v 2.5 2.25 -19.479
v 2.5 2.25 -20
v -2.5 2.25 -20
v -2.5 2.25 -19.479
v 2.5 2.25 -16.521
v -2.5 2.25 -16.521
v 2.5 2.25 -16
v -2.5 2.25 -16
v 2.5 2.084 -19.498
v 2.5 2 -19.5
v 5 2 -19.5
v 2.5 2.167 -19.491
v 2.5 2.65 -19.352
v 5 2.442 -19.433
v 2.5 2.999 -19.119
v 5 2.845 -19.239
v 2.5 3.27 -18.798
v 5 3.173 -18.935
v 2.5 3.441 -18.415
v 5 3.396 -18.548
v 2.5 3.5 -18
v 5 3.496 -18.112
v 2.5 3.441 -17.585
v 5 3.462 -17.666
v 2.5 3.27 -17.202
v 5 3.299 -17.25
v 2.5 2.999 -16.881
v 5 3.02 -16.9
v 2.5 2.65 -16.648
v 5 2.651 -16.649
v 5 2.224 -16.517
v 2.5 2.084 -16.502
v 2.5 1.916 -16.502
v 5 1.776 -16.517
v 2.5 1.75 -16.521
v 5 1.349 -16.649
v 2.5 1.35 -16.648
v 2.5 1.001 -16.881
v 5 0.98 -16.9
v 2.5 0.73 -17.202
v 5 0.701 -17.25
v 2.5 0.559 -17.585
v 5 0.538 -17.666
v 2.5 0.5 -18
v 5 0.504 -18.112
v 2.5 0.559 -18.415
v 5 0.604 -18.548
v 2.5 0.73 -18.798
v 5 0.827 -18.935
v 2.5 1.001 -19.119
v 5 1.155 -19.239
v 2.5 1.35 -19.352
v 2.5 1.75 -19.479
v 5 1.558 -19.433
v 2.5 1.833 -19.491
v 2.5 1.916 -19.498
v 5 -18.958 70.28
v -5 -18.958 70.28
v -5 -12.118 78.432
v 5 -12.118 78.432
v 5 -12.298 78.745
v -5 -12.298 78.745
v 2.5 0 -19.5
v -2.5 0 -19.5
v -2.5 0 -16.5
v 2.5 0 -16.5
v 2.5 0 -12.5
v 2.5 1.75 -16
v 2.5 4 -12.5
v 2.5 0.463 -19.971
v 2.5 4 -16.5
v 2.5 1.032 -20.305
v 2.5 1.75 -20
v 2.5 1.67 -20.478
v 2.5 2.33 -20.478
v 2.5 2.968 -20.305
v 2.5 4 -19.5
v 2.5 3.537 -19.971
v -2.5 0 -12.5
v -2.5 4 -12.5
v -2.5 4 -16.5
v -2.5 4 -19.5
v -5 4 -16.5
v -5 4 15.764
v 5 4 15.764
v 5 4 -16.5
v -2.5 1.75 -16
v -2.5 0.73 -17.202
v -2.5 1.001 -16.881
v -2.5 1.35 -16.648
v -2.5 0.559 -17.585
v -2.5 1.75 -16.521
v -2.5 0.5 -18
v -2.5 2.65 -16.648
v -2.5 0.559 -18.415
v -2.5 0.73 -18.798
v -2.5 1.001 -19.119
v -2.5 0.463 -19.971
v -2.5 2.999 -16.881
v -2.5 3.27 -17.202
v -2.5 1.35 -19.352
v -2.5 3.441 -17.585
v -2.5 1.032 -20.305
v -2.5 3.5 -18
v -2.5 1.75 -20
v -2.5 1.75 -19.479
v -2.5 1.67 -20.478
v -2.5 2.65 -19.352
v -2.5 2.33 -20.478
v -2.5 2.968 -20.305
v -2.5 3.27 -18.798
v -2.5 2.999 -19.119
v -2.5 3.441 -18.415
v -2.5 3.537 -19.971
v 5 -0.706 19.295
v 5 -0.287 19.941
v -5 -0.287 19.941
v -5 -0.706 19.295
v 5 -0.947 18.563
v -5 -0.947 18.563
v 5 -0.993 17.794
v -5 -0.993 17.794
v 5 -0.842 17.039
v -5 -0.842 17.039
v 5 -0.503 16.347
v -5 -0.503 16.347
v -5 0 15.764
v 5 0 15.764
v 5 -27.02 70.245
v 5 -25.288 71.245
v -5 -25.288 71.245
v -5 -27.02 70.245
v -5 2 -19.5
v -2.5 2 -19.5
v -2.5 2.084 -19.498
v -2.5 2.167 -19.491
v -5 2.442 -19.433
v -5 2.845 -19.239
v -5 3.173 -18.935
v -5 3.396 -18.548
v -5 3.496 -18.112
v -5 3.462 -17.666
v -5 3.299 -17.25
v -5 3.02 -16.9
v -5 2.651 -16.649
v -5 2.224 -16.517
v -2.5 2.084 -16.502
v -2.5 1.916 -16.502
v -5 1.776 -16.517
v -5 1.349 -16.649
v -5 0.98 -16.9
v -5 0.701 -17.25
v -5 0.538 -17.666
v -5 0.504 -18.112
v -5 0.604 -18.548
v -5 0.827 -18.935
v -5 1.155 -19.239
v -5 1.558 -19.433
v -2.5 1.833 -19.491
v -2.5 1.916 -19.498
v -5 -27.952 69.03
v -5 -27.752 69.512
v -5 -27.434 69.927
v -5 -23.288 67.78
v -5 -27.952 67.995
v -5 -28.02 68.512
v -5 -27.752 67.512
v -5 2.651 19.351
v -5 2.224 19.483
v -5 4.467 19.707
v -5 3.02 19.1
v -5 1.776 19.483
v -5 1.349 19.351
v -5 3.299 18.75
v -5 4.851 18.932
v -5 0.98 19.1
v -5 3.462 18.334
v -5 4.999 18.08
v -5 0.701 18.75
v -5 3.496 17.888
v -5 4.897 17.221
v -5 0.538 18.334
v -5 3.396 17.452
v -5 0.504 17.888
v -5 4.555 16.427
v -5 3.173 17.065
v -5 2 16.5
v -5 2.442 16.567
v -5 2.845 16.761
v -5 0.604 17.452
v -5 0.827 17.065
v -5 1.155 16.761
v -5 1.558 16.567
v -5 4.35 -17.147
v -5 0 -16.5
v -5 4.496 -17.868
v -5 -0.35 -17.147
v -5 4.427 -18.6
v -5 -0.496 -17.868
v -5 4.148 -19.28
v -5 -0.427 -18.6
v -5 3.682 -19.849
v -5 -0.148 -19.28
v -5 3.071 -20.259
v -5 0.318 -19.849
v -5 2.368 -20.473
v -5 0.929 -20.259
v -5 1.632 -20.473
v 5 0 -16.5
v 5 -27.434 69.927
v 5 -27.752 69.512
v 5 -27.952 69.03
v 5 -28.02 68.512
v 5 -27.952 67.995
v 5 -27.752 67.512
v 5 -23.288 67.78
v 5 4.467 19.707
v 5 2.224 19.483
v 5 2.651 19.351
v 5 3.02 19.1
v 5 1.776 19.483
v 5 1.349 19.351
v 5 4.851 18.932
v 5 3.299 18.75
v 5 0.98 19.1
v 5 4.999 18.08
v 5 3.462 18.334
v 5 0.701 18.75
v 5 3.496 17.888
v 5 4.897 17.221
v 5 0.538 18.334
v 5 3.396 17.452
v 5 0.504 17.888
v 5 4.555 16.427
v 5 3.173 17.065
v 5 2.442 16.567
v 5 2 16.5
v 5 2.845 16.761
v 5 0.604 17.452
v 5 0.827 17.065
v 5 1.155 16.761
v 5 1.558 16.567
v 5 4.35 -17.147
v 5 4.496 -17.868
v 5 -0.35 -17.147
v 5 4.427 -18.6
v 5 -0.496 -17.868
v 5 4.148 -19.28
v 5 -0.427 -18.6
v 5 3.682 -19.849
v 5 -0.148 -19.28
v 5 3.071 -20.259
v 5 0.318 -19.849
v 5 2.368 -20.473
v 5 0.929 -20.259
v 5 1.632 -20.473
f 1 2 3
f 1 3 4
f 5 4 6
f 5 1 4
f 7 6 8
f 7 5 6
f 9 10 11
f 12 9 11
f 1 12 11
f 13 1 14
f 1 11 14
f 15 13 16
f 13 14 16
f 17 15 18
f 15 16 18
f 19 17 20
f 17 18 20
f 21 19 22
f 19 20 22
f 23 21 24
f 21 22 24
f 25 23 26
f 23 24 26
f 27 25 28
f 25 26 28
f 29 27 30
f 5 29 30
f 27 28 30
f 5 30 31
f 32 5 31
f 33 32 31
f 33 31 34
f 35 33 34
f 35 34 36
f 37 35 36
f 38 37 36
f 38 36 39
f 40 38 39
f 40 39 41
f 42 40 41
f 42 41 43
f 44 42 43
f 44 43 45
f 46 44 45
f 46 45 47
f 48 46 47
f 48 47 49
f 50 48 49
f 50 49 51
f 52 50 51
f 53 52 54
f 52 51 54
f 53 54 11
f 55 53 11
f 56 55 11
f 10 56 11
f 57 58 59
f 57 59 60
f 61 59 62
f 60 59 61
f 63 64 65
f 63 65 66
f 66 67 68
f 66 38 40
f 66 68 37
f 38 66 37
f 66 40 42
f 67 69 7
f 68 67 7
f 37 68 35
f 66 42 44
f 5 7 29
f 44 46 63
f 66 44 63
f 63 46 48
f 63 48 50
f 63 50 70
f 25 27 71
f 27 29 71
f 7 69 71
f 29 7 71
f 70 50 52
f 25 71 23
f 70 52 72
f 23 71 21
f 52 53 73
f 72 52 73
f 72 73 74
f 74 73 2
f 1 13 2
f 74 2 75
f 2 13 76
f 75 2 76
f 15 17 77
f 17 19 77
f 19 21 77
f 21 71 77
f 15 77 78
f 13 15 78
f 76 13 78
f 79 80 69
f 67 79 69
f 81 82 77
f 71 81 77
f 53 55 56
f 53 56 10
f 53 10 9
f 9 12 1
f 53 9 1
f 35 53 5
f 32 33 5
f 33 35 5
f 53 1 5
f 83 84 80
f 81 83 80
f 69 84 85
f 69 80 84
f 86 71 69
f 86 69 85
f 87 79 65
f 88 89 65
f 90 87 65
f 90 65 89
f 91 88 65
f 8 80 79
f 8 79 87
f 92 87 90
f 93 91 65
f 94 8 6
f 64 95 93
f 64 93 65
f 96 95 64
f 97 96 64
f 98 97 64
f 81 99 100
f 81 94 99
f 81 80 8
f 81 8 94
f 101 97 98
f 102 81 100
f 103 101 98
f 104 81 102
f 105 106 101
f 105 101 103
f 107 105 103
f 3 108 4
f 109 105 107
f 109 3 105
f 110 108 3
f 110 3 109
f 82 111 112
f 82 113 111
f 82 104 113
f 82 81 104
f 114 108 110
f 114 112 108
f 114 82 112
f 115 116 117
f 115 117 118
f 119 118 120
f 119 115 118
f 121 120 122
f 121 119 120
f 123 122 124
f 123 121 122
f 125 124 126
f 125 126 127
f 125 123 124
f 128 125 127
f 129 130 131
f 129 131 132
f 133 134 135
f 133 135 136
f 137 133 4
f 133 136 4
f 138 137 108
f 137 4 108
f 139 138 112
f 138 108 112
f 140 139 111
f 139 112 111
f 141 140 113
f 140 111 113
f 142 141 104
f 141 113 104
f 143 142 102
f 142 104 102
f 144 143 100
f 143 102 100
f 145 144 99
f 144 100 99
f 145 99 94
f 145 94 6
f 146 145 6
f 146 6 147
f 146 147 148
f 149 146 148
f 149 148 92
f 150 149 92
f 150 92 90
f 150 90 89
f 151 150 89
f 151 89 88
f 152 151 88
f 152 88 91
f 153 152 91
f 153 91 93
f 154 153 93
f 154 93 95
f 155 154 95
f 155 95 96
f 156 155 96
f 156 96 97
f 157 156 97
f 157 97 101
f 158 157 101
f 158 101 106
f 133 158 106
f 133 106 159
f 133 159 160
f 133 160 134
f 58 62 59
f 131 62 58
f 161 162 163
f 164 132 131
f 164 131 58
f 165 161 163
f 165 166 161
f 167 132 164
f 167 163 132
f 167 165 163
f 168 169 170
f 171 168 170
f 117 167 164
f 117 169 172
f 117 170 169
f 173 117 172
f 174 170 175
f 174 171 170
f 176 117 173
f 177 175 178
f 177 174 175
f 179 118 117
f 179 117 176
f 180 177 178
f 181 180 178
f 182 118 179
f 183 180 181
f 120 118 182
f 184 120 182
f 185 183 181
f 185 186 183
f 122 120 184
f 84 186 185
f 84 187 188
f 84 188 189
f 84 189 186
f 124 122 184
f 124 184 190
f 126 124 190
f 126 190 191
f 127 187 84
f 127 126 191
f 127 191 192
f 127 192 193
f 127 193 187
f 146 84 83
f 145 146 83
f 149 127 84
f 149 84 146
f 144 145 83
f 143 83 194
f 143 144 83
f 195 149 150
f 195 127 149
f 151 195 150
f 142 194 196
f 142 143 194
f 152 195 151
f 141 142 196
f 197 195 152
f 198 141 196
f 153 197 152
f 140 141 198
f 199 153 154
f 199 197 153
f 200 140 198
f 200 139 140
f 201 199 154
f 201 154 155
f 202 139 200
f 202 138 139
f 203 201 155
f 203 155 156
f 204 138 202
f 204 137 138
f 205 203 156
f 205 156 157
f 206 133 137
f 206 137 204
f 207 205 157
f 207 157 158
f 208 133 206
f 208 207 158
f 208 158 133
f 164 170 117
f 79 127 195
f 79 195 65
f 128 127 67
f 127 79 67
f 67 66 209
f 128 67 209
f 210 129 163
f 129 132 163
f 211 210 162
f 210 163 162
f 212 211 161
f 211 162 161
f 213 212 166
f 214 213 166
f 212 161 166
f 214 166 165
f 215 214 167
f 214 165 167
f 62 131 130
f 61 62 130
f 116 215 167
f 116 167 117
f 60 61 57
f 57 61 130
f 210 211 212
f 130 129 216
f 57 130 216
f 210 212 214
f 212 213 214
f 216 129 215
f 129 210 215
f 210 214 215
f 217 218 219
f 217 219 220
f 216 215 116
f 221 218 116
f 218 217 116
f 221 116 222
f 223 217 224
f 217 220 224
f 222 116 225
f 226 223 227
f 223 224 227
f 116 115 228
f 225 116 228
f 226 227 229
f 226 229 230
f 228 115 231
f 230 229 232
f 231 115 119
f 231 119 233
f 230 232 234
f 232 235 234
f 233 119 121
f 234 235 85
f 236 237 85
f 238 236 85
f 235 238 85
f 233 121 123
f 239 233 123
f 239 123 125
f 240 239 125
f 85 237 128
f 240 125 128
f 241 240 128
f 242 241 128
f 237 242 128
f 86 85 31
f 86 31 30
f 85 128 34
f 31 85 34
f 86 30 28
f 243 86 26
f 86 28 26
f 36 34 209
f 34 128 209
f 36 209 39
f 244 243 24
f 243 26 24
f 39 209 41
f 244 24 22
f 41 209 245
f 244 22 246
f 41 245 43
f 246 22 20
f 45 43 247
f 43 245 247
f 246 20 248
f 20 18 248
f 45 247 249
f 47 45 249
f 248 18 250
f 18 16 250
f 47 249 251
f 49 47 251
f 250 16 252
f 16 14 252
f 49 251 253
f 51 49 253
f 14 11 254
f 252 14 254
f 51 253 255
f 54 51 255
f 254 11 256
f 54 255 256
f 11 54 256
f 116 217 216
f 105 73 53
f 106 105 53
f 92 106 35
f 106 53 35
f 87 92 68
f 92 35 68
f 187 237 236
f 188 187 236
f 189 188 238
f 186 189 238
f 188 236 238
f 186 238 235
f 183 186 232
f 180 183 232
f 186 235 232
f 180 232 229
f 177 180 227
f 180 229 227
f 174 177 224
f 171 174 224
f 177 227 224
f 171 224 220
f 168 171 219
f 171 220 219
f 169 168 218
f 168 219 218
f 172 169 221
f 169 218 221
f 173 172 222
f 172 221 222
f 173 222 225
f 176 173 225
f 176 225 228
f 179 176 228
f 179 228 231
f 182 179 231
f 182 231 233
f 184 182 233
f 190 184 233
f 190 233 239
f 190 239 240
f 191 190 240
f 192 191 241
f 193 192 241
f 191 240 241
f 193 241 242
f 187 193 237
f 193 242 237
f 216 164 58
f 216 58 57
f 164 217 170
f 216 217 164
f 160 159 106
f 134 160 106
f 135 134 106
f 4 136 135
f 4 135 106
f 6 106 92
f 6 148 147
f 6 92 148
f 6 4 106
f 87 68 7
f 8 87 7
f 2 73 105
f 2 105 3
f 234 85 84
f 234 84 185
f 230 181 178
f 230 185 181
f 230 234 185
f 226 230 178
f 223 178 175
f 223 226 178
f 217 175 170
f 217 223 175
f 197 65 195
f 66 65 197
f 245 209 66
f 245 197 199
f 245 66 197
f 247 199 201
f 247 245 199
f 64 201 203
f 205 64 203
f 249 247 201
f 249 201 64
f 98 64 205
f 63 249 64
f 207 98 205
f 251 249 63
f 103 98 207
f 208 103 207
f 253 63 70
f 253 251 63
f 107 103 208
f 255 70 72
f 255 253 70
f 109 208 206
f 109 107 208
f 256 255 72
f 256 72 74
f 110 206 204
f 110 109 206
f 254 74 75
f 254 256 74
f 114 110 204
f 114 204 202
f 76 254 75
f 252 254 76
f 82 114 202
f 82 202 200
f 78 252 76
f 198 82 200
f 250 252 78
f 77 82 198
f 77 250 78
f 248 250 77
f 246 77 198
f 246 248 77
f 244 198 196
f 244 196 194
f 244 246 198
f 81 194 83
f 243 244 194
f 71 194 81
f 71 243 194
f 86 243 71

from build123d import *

# Parameters (mm, degrees)
SKETCH1_W           = 10
SKETCH1_H           = 36
BOSS_EXTRUDE2_DEPTH = 4
SKETCH5_R           = 3
BOSS_EXTRUDE3_DEPTH = 10
SKETCH6_R           = 2.5
BOSS_EXTRUDE4_DEPTH = 10
SKETCH9_R           = 1.5
CUT_EXTRUDE2_DEPTH  = 10
SKETCH10_W          = 5
SKETCH10_H          = 8
CUT_EXTRUDE3_DEPTH  = 4
SKETCH11_W          = 4
SKETCH11_H          = 0.5
BOSS_EXTRUDE6_DEPTH = 5
BOSS_EXTRUDE7_DEPTH = 10
SKETCH7_R           = 1.5
CUT_EXTRUDE4_DEPTH  = 10
SKETCH14_W          = 10
SKETCH14_H          = 4
BOSS_EXTRUDE8_DEPTH = 15
FILLET2_R           = 2
CHAMFER1_SIZE       = 10
CHAMFER1_SIZE2      = 3.639702343


with BuildPart() as part:
    # Sketch1 → Boss-Extrude2 (new body)
    with BuildSketch(Plane(origin=(0, 0, 0), x_dir=(1, 0, 0), z_dir=(0, 1, 0))):
        Rectangle(SKETCH1_W, SKETCH1_H)
    extrude(amount=BOSS_EXTRUDE2_DEPTH)

    # Sketch5 → Boss-Extrude3 (add)
    with BuildSketch(Plane(origin=(5, 0, 0), x_dir=(0, 0, -1), z_dir=(1, 0, 0))):
        with Locations((-18, 2)):
            Circle(SKETCH5_R)
    extrude(amount=-BOSS_EXTRUDE3_DEPTH)

    # Sketch6 → Boss-Extrude4 (add)
    with BuildSketch(Plane(origin=(5, 0, 0), x_dir=(0, 0, -1), z_dir=(1, 0, 0))):
        with Locations((18, 2)):
            Circle(SKETCH6_R)
    extrude(amount=-BOSS_EXTRUDE4_DEPTH)

    # Sketch9 → Cut-Extrude2 (cut)
    with BuildSketch(Plane(origin=(5, 0, 0), x_dir=(0, 0, -1), z_dir=(1, 0, 0))):
        with Locations((18, 2)):
            Circle(SKETCH9_R)
    extrude(amount=-CUT_EXTRUDE2_DEPTH, mode=Mode.SUBTRACT)

    # Sketch10 → Cut-Extrude3 (cut)
    with BuildSketch(Plane(origin=(0, 4, 0), x_dir=(1, 0, 0), z_dir=(0, 1, 0))):
        with Locations((0, 16.5)):
            Rectangle(SKETCH10_W, SKETCH10_H)
    extrude(amount=-CUT_EXTRUDE3_DEPTH, mode=Mode.SUBTRACT)

    # Sketch11 → Boss-Extrude6 (add)
    with BuildSketch(Plane.ZY.offset(-2.5)):
        with Locations((-18, 2)):
            Rectangle(SKETCH11_W, SKETCH11_H)
    extrude(amount=BOSS_EXTRUDE6_DEPTH)

    # Sketch13 → Boss-Extrude7 (add)
    with BuildSketch(Plane(origin=(5, 0, 0), x_dir=(0, 0, -1), z_dir=(1, 0, 0))):
        Polygon((-19.282983434, 4.711817381), (-71.244507661, -25.288182619), (-69.244507661, -28.752284234), (-17.282983434, 1.247715766), align=None)
    extrude(amount=-BOSS_EXTRUDE7_DEPTH)

    # Sketch7 → Cut-Extrude4 (cut)
    with BuildSketch(Plane(origin=(5, 0, 0), x_dir=(0, 0, -1), z_dir=(1, 0, 0))):
        with Locations((-18, 2)):
            Circle(SKETCH7_R)
    extrude(amount=-CUT_EXTRUDE4_DEPTH, mode=Mode.SUBTRACT)

    # Sketch14 → Boss-Extrude8 (add)
    with BuildSketch(Plane(origin=(0, 11.883639793, 6.861022633), x_dir=(1, 0, 0), z_dir=(0, 0.8660254037844415, 0.49999999999999506))):
        with Locations((0, -72.343644824)):
            Rectangle(SKETCH14_W, SKETCH14_H)
    extrude(amount=BOSS_EXTRUDE8_DEPTH)

    # Fillet2
    fillet2_edges = [part.edges().sort_by_distance(p)[0] for p in [
        (0, -28.752284234, 69.244507661),
    ]]
    fillet(fillet2_edges, radius=FILLET2_R)

    # Chamfer1
    chamfer1_edges = [part.edges().sort_by_distance(p)[0] for p in [
        (0, -10.297801562, 75.280406046),
    ]]
    chamfer1_side = [part.faces().sort_by_distance(p)[0] for p in [
        (0, -16.792992091, 71.530406046),
    ]]
    chamfer(chamfer1_edges, length=CHAMFER1_SIZE, length2=CHAMFER1_SIZE2, reference=chamfer1_side[0])


solid = part.part
